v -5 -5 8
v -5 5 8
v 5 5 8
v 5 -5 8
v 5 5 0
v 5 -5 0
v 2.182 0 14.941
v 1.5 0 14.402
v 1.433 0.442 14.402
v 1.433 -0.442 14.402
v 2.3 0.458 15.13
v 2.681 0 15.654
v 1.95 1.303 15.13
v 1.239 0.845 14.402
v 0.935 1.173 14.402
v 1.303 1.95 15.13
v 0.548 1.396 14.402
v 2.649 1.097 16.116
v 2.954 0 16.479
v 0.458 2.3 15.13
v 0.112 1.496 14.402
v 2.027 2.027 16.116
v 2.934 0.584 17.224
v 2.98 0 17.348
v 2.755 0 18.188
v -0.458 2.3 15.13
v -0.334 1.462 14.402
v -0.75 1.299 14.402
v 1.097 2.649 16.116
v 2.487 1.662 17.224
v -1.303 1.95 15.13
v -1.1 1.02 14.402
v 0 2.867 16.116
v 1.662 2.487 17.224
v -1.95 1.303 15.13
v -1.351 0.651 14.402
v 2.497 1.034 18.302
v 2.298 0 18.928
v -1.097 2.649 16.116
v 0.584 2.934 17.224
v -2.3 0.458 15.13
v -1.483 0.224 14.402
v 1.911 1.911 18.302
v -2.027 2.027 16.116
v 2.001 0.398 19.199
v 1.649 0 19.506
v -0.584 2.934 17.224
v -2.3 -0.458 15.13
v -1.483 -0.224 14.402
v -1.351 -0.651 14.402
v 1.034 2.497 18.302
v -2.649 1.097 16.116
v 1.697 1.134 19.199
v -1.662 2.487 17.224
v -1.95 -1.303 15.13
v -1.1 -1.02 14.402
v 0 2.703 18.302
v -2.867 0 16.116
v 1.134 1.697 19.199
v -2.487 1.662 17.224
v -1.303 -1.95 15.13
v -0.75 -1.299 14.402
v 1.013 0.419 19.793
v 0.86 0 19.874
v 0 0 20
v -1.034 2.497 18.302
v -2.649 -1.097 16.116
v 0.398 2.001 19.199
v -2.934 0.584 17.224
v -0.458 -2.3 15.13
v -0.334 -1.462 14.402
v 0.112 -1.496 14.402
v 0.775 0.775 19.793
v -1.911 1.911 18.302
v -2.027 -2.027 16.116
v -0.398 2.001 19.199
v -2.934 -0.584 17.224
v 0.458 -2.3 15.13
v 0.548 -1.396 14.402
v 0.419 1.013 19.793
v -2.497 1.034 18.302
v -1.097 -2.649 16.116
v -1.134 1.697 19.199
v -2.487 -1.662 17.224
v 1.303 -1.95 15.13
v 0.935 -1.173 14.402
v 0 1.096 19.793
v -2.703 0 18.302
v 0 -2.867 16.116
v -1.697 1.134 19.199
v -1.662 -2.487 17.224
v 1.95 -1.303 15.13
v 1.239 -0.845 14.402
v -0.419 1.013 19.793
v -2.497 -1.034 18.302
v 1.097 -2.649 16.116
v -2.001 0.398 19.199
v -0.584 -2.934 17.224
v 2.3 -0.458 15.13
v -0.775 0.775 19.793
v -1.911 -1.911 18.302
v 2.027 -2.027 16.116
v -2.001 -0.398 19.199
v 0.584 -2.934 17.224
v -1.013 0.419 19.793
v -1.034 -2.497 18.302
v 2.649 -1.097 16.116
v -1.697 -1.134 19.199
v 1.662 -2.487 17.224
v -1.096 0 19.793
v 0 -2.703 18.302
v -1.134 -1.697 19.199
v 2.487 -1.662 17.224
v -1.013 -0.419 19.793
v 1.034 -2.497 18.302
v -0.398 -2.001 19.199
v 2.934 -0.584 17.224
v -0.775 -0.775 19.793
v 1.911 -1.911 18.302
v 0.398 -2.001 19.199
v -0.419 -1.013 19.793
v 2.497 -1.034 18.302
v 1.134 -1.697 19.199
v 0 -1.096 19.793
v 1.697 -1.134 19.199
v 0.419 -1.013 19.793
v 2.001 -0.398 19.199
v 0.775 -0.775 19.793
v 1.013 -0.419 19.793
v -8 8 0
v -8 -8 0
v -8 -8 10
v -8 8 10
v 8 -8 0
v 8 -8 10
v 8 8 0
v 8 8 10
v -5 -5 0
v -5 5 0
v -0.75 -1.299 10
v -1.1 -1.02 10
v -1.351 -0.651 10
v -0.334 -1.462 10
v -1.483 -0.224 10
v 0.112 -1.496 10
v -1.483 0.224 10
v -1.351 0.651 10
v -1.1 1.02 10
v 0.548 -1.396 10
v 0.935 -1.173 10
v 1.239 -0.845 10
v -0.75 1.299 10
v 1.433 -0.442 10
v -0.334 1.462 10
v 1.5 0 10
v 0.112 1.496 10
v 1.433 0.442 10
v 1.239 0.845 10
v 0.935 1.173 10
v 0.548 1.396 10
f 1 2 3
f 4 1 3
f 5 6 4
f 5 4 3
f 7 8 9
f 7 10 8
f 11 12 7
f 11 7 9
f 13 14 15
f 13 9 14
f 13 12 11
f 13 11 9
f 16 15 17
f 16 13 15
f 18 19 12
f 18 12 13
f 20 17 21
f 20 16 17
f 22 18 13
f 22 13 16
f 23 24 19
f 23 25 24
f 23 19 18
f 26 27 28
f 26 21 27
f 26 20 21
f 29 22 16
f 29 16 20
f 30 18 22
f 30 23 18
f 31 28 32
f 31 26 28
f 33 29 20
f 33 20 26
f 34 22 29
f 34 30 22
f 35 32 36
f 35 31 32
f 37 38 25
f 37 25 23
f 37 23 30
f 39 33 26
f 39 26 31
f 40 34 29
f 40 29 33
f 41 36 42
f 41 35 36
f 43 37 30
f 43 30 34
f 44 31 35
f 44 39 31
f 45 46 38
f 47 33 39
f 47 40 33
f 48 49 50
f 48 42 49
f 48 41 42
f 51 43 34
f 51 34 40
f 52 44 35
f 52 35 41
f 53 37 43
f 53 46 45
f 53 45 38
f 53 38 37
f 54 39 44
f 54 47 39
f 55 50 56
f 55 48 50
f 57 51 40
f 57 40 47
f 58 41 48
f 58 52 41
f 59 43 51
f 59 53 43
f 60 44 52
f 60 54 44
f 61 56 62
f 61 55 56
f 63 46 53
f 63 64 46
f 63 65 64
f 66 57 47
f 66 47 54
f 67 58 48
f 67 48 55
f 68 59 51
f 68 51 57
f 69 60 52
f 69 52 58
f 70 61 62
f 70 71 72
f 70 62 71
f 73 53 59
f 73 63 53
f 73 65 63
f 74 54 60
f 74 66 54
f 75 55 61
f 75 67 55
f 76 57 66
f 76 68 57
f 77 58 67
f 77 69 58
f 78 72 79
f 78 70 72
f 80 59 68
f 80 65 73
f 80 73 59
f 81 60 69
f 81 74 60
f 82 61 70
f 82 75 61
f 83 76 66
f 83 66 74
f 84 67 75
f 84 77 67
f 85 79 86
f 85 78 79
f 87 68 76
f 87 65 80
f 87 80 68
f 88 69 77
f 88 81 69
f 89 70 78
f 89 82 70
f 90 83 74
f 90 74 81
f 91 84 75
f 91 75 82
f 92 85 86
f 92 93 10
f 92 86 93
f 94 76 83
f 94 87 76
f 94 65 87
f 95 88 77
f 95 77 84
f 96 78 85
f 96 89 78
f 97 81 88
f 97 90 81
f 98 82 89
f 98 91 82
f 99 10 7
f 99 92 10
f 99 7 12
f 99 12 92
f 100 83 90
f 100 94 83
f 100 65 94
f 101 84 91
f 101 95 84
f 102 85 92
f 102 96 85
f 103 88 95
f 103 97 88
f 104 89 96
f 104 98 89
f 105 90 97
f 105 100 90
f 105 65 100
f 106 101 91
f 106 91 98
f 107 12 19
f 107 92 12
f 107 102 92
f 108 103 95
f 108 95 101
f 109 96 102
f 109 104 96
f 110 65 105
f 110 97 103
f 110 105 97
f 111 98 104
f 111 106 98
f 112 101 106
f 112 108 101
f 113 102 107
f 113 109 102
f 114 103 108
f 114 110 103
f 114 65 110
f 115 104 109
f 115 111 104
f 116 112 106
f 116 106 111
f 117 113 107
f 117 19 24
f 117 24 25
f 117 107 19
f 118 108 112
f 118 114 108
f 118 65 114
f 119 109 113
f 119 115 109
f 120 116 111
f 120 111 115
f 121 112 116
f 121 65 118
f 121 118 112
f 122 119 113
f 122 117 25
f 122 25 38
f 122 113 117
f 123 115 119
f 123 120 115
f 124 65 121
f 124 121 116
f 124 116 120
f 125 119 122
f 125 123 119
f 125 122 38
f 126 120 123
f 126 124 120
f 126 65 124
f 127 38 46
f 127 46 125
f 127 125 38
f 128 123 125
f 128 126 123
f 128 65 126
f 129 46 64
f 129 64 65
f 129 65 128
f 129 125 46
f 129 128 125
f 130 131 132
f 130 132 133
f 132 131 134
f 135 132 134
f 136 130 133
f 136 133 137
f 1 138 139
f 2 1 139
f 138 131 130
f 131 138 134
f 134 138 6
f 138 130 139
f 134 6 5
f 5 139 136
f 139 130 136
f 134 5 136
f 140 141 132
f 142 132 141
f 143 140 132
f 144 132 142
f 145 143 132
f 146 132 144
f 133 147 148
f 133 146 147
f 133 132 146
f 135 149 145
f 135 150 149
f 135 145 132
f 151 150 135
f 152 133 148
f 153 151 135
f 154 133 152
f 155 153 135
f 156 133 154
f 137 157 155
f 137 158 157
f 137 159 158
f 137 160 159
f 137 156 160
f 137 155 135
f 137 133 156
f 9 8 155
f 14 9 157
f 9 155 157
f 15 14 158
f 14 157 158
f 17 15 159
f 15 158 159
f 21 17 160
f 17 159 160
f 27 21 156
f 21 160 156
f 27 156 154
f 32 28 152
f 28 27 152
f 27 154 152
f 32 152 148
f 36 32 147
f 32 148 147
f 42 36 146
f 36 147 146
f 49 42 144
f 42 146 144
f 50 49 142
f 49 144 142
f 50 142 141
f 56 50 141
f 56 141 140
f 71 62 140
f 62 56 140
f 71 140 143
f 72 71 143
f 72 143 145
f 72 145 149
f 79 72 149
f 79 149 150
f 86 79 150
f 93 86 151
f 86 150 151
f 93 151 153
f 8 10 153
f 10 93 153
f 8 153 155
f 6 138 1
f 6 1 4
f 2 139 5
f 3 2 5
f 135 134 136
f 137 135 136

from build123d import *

# Parameters (mm, degrees)
BOX001_W       = 10
BOX001_H       = 10
BOX001_DEPTH   = 8
CYLINDER_R     = 1.5
CYLINDER_DEPTH = 5
BOX_W          = 16
BOX_H          = 16
BOX_DEPTH      = 10


with BuildPart() as cube001:
    # Box001 → Box001 (new body)
    with BuildSketch(Plane(origin=(-5, -5, 0), x_dir=(1, 0, 0), z_dir=(0, 0, 1))):
        with Locations((5, 5)):
            Rectangle(BOX001_W, BOX001_H)
    extrude(amount=BOX001_DEPTH)


with BuildPart() as cylinder:
    # Cylinder → Cylinder (new body)
    with BuildSketch(Plane.XY.offset(10)):
        Circle(CYLINDER_R)
    extrude(amount=CYLINDER_DEPTH)


with BuildPart() as sphere:
    # Sphere → Sphere (revolve)
    with BuildSketch(Plane(origin=(0, 0, 17), x_dir=(1, 0, 0), z_dir=(0, -1, 0))):
        with BuildLine():
            ThreePointArc((0, -3), (3, 0), (0, 3))
            Line((0, 3), (0, -3))
        make_face()
    revolve(axis=Axis((0, 0, 17), (0, 0, 1)))


with BuildPart() as cut:
    # Box → Box (new body)
    with BuildSketch(Plane(origin=(-8, -8, 0), x_dir=(1, 0, 0), z_dir=(0, 0, 1))):
        with Locations((8, 8)):
            Rectangle(BOX_W, BOX_H)
    extrude(amount=BOX_DEPTH)

    # Fusion: union Cylinder, Sphere
    add(cylinder.part)
    add(sphere.part)

    # Cut: cut Cube001
    add(cube001.part, mode=Mode.SUBTRACT)


solid = cut.part
